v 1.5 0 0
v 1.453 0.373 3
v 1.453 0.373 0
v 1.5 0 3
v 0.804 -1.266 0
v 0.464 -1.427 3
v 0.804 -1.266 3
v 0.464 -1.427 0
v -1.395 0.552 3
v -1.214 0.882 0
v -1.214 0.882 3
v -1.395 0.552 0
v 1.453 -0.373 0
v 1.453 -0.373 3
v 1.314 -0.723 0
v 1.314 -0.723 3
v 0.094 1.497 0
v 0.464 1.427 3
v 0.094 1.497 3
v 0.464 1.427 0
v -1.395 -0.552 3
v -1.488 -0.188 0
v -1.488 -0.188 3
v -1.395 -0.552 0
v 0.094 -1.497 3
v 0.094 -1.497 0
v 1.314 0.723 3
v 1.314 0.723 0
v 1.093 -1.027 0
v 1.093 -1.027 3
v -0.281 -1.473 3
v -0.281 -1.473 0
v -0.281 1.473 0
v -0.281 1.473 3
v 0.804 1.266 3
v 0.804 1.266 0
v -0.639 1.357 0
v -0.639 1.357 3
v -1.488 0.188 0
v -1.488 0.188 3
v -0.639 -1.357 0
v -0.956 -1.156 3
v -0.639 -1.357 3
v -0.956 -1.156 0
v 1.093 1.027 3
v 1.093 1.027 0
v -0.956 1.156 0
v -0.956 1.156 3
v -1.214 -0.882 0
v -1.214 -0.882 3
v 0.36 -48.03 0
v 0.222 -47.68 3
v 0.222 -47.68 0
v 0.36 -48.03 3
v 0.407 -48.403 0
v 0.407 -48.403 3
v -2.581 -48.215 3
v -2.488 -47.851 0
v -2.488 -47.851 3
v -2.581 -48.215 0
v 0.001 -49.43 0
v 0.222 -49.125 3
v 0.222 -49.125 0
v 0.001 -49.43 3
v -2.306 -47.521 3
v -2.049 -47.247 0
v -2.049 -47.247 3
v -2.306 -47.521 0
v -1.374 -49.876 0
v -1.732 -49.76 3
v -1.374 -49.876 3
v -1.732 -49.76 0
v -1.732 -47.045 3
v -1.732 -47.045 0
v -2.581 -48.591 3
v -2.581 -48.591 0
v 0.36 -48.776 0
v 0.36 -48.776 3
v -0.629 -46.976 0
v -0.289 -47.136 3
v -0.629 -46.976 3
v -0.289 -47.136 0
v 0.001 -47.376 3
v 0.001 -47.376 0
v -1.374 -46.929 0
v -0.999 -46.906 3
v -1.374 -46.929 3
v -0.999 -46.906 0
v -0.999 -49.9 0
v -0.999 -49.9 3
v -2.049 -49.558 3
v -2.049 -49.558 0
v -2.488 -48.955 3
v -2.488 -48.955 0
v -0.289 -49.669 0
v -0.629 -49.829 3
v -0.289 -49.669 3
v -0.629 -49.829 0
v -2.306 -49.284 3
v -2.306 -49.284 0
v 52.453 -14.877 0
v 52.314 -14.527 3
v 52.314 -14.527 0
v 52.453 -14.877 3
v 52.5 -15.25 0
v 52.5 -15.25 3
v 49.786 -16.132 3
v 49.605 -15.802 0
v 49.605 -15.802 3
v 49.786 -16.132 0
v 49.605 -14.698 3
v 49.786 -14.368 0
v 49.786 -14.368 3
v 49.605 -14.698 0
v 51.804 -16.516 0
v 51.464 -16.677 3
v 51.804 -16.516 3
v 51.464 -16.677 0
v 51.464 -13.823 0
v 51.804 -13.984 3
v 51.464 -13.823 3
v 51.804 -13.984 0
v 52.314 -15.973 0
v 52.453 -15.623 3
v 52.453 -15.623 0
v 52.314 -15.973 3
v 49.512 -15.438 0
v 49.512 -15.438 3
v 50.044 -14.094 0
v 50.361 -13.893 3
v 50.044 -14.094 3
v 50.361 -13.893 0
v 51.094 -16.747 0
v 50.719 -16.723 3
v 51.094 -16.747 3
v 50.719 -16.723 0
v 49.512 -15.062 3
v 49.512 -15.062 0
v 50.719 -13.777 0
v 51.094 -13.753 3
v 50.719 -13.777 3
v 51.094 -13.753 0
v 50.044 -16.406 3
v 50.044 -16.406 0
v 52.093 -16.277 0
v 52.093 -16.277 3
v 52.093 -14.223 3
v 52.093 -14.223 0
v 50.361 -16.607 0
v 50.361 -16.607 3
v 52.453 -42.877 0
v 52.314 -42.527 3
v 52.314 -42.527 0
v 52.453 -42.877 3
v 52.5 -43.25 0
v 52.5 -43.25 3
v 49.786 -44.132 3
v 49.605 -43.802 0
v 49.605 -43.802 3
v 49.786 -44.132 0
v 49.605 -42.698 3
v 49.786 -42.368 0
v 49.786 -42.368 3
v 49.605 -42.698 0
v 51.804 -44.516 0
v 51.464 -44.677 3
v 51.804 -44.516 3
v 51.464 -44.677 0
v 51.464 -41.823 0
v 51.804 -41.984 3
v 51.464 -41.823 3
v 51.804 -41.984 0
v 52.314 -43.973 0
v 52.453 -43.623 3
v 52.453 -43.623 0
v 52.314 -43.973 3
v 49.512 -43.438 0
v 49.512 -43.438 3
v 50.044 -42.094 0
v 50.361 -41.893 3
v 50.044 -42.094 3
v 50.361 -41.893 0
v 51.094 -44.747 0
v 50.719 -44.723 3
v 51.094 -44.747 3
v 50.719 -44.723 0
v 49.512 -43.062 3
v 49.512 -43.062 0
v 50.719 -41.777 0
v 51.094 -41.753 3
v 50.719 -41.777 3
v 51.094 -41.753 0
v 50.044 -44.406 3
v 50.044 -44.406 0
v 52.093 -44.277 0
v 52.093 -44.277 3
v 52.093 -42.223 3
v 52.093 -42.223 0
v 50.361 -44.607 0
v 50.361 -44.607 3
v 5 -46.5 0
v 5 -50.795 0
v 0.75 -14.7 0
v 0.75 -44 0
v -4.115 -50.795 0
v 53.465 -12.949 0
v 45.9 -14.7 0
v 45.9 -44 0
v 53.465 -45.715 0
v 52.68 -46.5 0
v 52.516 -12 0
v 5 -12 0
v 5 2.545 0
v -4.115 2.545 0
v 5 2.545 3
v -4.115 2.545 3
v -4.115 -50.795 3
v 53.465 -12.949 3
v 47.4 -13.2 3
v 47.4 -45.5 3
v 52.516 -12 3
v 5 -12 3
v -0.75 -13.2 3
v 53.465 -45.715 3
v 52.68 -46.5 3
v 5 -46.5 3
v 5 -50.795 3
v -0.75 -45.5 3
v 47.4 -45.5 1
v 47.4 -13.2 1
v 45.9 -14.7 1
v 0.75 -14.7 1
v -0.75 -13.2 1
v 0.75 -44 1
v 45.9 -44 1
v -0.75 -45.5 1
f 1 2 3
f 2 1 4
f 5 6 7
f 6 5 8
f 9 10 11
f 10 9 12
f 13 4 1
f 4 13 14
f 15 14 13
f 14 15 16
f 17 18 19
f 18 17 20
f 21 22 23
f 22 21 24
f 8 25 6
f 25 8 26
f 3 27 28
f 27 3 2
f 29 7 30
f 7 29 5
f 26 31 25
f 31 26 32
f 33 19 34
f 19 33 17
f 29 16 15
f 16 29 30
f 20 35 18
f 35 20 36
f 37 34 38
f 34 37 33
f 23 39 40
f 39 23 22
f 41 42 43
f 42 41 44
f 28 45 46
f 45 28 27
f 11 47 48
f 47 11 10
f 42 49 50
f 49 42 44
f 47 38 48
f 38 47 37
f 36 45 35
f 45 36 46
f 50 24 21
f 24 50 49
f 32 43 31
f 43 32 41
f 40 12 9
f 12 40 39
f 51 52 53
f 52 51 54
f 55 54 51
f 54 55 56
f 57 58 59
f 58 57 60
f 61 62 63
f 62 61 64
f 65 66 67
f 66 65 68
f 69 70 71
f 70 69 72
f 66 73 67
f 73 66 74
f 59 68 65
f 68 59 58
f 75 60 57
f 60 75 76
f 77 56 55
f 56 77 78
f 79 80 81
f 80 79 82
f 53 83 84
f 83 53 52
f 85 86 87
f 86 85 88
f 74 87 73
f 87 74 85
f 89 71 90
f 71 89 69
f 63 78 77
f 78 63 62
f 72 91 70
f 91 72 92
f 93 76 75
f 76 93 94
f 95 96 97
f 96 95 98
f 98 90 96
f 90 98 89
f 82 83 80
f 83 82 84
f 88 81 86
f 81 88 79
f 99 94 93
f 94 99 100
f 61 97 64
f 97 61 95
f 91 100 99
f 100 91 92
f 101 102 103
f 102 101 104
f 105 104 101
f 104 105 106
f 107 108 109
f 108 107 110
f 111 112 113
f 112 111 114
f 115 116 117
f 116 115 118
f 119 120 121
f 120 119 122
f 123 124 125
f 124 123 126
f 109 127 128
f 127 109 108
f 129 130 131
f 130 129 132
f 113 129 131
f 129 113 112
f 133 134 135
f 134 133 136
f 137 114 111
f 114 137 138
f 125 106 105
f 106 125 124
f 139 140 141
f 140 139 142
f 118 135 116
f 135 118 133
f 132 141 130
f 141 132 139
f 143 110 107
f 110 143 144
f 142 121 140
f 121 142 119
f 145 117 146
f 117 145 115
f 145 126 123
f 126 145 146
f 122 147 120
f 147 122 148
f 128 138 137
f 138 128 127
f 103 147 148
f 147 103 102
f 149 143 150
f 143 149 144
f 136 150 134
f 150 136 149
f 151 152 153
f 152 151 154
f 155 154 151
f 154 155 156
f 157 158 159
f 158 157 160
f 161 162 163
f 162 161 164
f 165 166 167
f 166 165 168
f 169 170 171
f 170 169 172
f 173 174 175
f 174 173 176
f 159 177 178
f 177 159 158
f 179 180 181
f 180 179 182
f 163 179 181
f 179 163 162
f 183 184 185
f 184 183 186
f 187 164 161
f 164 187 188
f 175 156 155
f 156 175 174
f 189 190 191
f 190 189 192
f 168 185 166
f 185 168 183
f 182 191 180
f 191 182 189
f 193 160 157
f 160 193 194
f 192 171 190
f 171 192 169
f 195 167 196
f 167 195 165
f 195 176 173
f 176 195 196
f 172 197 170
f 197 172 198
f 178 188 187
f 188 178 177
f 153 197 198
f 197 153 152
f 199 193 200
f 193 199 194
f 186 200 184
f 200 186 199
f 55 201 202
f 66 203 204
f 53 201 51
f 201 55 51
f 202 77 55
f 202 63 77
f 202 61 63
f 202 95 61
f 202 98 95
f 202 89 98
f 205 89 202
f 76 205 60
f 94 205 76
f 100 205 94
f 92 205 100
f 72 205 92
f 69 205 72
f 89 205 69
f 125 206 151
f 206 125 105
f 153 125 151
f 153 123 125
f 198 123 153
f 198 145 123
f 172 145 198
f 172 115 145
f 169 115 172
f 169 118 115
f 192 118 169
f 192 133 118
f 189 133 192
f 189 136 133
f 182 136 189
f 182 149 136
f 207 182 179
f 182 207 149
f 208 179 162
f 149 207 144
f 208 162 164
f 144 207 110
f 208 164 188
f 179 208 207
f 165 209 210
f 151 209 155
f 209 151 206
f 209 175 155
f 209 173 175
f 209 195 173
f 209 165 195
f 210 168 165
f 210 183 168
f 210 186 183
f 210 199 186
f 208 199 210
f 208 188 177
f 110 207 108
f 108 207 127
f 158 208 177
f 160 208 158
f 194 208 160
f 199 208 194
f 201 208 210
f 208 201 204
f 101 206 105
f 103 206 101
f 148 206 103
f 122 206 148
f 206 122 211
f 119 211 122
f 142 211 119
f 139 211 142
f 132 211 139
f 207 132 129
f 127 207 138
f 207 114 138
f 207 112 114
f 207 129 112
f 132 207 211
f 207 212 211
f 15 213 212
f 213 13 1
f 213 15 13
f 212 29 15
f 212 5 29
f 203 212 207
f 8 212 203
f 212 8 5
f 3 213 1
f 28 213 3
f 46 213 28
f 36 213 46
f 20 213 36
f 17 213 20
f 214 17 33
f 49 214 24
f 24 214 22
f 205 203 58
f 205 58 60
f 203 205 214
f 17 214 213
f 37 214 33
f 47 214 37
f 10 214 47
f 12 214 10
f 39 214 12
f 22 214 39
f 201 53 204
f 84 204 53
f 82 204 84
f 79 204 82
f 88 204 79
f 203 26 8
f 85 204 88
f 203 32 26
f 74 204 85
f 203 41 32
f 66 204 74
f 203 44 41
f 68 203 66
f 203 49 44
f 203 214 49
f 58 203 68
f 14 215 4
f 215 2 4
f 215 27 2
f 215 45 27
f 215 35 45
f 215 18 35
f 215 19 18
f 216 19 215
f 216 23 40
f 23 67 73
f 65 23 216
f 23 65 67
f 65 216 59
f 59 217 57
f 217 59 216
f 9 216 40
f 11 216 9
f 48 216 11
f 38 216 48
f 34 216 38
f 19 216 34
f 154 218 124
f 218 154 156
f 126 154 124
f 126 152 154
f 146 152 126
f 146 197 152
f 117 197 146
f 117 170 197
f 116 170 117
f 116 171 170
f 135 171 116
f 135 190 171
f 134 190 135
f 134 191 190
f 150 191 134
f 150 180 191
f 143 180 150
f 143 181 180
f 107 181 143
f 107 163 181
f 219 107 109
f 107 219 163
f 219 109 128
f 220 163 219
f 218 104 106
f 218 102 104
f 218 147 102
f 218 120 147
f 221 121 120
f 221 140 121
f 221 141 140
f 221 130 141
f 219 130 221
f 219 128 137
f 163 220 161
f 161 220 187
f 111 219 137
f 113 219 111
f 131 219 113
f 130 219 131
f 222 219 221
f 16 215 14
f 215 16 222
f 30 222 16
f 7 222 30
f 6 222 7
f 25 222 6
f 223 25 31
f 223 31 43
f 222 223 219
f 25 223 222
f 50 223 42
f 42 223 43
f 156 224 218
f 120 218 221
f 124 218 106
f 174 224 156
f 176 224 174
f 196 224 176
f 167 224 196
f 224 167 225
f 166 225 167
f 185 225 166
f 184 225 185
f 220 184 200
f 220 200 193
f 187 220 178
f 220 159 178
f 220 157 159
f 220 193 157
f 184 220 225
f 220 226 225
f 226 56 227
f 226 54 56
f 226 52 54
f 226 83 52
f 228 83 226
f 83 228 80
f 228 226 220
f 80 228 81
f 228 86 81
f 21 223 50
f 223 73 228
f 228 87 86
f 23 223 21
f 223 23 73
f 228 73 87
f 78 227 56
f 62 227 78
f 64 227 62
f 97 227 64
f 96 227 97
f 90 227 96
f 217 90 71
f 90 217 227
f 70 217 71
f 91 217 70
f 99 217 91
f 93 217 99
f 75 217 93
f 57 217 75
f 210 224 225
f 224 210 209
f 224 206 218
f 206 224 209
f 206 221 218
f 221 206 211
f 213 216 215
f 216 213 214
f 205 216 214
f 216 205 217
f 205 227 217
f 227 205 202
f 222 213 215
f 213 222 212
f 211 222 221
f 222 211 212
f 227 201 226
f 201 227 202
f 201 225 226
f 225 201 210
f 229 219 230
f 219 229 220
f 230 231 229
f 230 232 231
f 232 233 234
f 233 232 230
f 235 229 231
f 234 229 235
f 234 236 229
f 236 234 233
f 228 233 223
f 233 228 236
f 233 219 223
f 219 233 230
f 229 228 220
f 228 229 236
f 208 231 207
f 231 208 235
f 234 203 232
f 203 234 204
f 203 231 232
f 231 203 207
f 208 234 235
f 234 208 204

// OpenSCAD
/* arduino.scad
 *
 * Copyright (C) Jestin Stoffel 2012
 *
 * This library is free software; you can redistribute it and/or
 * modify it under the terms of the GNU Library General Public
 * License as published by the Free Software Foundation; either
 * version 2 of the License, or (at your option) any later version.
 *
 * This library is distributed in the hope that it will be useful,
 * but WITHOUT ANY WARRANTY; without even the implied warranty of
 * MERCHANTABILITY or FITNESS FOR A PARTICULAR PURPOSE.  See the GNU
 * Library General Public License for more details.
 *
 * You should have received a copy of the GNU Library General Public
 * License along with this library; if not, write to the Free
 * Software Foundation, Inc., 675 Mass Ave, Cambridge, MA 02139, USA.
 */

// Throughout this entire model, (0,0) is the top left mounting hole (nearest  the USB port)

// thickness of the PCB
board_height = 3;

// solid_holes - specifies if mounting holes should be added to or subtracted from the model
// combined_headers - specifies if space should be left between adjacent female headers, or if they should be rendered as a single header
// extend_ports - extends the USB and power ports by a centimeter, so that holes are more easily made when a model is used as a negative

module Board()
{
	color([0, 0.6, 0.8])
	linear_extrude(height = board_height, convexity = 10, twist = 0)
	{
		polygon( points = [ [-4.115, 2.545],
						[49.4, 2.545],
						[50.925, 1.021],
						[50.925, -10.409],
						[53.465, -12.949],
						[53.465, -45.715],
						[50.925, -48.255],
						[50.925, -50.795],
						[-4.115, -50.795] ],
				paths = [[0, 1, 2, 3, 4, 5, 6, 7, 8]],
				convexity = 10);
	}
}

module MountingHoles()
{
	translate([0, 0, -10])
	{
		ArduinoHole(25);
		translate([-1.0929112, -48.4026972, 0]) ArduinoHole(25);
		translate([51, -15.25, 0]) ArduinoHole(25);
		translate([51, -43.25, 0]) ArduinoHole(25);
	}
}

module ArduinoHole(length)
{
	color([0.7, 0.7, 0.7])
	cylinder(r=1.5, h=length, $fn=25);
}

module Arduino() {
    difference()
		{
			Board();
			MountingHoles();
            translate([5,-12,0])
                cube([50, 15, 3]);
            translate([5,-61.5,0])
                cube([50, 15, 3]);
            translate([-0.75,-45.5,1])
                cube([48.15, 32.3, 3]);
            translate([-0.75+1.5,-45.5+1.5,0])
                cube([48.15-3, 32.3-3, 3]);
		}
}

Arduino();
